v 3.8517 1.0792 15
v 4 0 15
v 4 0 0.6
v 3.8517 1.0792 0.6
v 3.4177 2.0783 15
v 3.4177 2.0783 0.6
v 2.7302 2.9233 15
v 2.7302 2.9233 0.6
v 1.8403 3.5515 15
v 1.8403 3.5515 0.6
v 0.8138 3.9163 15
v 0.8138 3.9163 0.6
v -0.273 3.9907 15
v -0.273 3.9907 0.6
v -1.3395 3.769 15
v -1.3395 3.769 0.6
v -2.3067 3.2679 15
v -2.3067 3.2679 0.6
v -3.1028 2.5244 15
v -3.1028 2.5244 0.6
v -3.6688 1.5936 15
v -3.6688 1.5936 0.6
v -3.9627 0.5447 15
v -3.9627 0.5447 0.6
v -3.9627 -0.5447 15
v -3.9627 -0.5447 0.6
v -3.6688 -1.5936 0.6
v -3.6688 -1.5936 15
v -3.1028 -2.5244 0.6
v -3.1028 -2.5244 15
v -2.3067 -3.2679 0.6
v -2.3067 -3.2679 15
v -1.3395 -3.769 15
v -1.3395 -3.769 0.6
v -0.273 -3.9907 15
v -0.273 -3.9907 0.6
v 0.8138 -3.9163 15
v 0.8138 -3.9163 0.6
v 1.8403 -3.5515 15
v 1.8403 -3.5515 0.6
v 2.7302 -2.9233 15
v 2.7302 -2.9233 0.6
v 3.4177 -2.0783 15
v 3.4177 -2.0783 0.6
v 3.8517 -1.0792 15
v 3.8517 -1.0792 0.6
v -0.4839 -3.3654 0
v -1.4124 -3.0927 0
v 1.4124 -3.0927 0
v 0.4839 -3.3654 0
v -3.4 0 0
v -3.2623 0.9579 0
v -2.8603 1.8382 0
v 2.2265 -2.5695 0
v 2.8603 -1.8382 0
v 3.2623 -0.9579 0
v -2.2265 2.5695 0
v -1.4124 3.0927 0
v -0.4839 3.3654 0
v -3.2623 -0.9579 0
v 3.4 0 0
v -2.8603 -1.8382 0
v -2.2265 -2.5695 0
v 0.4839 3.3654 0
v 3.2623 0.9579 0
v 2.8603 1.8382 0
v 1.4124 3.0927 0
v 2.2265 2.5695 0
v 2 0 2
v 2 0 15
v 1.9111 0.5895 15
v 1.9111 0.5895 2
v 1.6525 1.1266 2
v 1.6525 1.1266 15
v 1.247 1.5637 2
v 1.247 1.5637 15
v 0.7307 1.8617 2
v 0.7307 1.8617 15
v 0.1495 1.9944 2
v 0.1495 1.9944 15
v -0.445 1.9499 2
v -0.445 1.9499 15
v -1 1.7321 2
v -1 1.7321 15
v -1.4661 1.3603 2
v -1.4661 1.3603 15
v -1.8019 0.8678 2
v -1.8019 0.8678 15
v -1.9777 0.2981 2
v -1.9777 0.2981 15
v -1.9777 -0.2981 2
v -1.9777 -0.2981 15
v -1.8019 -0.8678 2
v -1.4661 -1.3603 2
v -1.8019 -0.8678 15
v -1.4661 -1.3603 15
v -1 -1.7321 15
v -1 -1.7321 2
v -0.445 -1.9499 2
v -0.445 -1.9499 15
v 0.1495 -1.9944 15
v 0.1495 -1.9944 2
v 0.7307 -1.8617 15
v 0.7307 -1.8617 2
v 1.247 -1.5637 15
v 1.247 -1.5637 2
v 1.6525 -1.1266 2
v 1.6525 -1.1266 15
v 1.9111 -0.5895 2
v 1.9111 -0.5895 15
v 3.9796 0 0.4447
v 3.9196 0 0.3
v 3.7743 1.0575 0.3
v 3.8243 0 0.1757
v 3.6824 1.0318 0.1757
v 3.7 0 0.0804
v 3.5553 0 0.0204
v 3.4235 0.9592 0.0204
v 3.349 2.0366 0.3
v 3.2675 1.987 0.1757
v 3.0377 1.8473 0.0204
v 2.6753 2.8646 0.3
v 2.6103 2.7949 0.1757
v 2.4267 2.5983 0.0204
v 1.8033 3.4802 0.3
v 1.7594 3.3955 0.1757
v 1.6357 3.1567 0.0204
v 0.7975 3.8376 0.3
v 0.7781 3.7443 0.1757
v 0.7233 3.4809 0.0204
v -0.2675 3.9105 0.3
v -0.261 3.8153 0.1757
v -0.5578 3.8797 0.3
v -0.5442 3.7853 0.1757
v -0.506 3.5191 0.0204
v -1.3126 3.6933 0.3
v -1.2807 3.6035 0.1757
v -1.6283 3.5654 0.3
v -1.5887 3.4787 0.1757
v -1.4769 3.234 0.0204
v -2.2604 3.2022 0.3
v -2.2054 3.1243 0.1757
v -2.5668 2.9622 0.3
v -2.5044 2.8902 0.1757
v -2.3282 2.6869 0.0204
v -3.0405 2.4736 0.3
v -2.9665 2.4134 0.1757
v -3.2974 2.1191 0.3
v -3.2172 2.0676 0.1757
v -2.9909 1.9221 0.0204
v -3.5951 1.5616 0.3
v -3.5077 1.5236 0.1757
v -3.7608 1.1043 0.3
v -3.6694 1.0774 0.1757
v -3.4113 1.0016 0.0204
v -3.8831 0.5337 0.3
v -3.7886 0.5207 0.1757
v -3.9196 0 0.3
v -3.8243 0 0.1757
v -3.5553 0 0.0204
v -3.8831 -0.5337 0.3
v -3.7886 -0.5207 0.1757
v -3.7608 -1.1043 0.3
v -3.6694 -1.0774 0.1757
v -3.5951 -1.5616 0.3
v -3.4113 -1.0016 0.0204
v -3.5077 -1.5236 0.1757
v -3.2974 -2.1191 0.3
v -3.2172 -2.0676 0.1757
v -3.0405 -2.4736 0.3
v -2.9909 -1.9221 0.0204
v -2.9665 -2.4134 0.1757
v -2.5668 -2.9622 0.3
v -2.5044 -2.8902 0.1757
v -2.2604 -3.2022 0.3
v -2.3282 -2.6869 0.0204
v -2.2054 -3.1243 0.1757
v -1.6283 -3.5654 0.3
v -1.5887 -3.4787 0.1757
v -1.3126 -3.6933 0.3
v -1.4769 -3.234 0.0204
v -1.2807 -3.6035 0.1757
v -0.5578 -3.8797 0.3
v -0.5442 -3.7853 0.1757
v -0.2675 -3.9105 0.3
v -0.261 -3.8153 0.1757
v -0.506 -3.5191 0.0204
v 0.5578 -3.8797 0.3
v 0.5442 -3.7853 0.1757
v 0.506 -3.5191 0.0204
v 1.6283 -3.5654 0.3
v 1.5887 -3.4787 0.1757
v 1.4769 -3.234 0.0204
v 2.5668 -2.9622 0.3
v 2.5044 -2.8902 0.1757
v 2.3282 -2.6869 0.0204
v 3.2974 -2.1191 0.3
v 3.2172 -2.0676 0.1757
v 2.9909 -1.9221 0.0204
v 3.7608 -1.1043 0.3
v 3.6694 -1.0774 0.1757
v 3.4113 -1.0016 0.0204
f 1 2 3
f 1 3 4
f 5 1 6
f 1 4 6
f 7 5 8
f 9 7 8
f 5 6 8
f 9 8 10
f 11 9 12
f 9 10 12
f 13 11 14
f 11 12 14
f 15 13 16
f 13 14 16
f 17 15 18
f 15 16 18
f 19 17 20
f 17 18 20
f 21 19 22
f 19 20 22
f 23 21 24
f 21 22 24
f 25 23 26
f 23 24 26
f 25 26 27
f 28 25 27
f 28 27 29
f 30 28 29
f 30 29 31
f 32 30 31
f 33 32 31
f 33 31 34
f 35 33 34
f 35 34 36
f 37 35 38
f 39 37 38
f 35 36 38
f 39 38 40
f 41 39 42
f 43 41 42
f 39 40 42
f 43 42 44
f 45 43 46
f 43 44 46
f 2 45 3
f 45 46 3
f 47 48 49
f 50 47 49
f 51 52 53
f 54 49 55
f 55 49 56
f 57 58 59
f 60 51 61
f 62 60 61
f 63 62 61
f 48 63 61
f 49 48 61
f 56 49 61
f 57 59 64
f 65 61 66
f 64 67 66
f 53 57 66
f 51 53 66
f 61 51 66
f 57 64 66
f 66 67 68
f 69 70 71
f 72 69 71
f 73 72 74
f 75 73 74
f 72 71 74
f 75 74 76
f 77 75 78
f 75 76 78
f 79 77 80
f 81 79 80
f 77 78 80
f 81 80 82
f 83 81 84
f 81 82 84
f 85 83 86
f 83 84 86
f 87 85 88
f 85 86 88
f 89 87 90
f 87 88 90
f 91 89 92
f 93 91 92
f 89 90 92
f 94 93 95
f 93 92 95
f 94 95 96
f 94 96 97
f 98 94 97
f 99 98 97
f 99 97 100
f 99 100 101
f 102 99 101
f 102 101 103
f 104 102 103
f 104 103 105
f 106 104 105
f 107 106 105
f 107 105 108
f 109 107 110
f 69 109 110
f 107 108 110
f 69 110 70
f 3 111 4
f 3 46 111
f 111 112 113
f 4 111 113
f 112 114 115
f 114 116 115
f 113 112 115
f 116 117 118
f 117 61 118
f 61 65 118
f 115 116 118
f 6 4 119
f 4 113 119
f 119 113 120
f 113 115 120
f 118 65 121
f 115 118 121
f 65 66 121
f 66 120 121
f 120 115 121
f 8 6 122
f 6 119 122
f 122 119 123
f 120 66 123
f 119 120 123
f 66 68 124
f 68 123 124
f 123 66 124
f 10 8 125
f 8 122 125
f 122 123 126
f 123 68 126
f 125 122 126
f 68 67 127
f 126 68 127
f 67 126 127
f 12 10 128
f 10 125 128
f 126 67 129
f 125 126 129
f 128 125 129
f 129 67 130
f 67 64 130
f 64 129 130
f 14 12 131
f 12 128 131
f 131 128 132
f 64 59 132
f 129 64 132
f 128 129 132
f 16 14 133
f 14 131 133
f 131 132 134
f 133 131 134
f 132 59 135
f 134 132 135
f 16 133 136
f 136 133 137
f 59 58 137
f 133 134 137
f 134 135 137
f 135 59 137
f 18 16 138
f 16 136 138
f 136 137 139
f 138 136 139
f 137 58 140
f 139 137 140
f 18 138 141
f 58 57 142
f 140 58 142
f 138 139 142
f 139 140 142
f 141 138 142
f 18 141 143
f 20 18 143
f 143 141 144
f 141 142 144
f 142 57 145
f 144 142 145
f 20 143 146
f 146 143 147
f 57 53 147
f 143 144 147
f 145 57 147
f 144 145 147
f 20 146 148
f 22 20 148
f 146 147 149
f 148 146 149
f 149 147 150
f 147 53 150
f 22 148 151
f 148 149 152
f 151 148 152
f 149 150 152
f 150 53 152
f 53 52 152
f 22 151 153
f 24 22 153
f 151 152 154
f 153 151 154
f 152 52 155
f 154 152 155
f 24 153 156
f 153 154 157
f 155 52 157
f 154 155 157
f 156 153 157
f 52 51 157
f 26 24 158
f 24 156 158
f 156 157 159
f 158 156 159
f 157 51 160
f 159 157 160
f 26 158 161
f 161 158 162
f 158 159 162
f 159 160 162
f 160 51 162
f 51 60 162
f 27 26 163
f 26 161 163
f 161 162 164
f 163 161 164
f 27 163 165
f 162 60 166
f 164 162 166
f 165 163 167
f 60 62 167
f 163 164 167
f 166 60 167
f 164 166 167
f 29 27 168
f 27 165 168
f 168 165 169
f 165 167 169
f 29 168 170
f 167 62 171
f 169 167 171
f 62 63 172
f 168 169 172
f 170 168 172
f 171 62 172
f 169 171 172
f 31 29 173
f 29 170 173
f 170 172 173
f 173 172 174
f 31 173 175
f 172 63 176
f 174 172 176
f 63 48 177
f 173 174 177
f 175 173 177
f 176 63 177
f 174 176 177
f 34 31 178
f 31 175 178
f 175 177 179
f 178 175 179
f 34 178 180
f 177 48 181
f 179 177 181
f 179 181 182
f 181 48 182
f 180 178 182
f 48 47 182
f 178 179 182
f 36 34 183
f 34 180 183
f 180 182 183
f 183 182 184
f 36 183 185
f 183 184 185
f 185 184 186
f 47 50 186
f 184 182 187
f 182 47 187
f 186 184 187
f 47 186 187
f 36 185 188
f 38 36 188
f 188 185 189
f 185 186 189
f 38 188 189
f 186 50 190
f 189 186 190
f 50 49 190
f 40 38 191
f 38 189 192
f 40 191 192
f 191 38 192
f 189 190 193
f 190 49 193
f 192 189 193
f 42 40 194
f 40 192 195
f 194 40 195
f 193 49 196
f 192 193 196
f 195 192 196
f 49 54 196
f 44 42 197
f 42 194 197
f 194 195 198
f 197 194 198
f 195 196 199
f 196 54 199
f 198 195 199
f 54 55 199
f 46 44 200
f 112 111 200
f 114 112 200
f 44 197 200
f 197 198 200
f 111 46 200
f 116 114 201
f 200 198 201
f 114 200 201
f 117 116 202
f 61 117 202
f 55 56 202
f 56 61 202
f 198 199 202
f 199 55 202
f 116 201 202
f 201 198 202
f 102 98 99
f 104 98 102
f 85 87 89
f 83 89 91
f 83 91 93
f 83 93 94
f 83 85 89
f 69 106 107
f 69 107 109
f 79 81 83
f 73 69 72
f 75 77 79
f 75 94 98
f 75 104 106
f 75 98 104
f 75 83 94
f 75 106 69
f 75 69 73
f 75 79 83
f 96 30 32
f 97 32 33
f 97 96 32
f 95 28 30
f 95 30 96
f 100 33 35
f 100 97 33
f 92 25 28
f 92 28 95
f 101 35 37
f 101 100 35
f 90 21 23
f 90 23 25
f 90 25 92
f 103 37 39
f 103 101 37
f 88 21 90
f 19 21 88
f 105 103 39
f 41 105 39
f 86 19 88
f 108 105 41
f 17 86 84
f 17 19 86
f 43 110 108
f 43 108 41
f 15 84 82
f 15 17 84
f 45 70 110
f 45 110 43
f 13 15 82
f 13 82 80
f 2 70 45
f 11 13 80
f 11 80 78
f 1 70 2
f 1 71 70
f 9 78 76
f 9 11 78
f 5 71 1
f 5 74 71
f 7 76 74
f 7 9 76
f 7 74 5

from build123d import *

# Parameters (mm, degrees)
SKETCH1_R           = 4
BOSS_EXTRUDE1_DEPTH = 15
SKETCH2_R           = 2
CUT_EXTRUDE1_DEPTH  = 13
FILLET1_R           = 0.6


with BuildPart() as part:
    # Sketch1 → Boss-Extrude1 (new body)
    with BuildSketch(Plane.XY):
        Circle(SKETCH1_R)
    extrude(amount=BOSS_EXTRUDE1_DEPTH)

    # Sketch2 → Cut-Extrude1 (cut)
    with BuildSketch(Plane.XY.offset(15)):
        Circle(SKETCH2_R)
    extrude(amount=-CUT_EXTRUDE1_DEPTH, mode=Mode.SUBTRACT)

    # Fillet1
    fillet1_edges = [part.edges().sort_by_distance(p)[0] for p in [
        (-4, 0, 0),
    ]]
    fillet(fillet1_edges, radius=FILLET1_R)


solid = part.part
